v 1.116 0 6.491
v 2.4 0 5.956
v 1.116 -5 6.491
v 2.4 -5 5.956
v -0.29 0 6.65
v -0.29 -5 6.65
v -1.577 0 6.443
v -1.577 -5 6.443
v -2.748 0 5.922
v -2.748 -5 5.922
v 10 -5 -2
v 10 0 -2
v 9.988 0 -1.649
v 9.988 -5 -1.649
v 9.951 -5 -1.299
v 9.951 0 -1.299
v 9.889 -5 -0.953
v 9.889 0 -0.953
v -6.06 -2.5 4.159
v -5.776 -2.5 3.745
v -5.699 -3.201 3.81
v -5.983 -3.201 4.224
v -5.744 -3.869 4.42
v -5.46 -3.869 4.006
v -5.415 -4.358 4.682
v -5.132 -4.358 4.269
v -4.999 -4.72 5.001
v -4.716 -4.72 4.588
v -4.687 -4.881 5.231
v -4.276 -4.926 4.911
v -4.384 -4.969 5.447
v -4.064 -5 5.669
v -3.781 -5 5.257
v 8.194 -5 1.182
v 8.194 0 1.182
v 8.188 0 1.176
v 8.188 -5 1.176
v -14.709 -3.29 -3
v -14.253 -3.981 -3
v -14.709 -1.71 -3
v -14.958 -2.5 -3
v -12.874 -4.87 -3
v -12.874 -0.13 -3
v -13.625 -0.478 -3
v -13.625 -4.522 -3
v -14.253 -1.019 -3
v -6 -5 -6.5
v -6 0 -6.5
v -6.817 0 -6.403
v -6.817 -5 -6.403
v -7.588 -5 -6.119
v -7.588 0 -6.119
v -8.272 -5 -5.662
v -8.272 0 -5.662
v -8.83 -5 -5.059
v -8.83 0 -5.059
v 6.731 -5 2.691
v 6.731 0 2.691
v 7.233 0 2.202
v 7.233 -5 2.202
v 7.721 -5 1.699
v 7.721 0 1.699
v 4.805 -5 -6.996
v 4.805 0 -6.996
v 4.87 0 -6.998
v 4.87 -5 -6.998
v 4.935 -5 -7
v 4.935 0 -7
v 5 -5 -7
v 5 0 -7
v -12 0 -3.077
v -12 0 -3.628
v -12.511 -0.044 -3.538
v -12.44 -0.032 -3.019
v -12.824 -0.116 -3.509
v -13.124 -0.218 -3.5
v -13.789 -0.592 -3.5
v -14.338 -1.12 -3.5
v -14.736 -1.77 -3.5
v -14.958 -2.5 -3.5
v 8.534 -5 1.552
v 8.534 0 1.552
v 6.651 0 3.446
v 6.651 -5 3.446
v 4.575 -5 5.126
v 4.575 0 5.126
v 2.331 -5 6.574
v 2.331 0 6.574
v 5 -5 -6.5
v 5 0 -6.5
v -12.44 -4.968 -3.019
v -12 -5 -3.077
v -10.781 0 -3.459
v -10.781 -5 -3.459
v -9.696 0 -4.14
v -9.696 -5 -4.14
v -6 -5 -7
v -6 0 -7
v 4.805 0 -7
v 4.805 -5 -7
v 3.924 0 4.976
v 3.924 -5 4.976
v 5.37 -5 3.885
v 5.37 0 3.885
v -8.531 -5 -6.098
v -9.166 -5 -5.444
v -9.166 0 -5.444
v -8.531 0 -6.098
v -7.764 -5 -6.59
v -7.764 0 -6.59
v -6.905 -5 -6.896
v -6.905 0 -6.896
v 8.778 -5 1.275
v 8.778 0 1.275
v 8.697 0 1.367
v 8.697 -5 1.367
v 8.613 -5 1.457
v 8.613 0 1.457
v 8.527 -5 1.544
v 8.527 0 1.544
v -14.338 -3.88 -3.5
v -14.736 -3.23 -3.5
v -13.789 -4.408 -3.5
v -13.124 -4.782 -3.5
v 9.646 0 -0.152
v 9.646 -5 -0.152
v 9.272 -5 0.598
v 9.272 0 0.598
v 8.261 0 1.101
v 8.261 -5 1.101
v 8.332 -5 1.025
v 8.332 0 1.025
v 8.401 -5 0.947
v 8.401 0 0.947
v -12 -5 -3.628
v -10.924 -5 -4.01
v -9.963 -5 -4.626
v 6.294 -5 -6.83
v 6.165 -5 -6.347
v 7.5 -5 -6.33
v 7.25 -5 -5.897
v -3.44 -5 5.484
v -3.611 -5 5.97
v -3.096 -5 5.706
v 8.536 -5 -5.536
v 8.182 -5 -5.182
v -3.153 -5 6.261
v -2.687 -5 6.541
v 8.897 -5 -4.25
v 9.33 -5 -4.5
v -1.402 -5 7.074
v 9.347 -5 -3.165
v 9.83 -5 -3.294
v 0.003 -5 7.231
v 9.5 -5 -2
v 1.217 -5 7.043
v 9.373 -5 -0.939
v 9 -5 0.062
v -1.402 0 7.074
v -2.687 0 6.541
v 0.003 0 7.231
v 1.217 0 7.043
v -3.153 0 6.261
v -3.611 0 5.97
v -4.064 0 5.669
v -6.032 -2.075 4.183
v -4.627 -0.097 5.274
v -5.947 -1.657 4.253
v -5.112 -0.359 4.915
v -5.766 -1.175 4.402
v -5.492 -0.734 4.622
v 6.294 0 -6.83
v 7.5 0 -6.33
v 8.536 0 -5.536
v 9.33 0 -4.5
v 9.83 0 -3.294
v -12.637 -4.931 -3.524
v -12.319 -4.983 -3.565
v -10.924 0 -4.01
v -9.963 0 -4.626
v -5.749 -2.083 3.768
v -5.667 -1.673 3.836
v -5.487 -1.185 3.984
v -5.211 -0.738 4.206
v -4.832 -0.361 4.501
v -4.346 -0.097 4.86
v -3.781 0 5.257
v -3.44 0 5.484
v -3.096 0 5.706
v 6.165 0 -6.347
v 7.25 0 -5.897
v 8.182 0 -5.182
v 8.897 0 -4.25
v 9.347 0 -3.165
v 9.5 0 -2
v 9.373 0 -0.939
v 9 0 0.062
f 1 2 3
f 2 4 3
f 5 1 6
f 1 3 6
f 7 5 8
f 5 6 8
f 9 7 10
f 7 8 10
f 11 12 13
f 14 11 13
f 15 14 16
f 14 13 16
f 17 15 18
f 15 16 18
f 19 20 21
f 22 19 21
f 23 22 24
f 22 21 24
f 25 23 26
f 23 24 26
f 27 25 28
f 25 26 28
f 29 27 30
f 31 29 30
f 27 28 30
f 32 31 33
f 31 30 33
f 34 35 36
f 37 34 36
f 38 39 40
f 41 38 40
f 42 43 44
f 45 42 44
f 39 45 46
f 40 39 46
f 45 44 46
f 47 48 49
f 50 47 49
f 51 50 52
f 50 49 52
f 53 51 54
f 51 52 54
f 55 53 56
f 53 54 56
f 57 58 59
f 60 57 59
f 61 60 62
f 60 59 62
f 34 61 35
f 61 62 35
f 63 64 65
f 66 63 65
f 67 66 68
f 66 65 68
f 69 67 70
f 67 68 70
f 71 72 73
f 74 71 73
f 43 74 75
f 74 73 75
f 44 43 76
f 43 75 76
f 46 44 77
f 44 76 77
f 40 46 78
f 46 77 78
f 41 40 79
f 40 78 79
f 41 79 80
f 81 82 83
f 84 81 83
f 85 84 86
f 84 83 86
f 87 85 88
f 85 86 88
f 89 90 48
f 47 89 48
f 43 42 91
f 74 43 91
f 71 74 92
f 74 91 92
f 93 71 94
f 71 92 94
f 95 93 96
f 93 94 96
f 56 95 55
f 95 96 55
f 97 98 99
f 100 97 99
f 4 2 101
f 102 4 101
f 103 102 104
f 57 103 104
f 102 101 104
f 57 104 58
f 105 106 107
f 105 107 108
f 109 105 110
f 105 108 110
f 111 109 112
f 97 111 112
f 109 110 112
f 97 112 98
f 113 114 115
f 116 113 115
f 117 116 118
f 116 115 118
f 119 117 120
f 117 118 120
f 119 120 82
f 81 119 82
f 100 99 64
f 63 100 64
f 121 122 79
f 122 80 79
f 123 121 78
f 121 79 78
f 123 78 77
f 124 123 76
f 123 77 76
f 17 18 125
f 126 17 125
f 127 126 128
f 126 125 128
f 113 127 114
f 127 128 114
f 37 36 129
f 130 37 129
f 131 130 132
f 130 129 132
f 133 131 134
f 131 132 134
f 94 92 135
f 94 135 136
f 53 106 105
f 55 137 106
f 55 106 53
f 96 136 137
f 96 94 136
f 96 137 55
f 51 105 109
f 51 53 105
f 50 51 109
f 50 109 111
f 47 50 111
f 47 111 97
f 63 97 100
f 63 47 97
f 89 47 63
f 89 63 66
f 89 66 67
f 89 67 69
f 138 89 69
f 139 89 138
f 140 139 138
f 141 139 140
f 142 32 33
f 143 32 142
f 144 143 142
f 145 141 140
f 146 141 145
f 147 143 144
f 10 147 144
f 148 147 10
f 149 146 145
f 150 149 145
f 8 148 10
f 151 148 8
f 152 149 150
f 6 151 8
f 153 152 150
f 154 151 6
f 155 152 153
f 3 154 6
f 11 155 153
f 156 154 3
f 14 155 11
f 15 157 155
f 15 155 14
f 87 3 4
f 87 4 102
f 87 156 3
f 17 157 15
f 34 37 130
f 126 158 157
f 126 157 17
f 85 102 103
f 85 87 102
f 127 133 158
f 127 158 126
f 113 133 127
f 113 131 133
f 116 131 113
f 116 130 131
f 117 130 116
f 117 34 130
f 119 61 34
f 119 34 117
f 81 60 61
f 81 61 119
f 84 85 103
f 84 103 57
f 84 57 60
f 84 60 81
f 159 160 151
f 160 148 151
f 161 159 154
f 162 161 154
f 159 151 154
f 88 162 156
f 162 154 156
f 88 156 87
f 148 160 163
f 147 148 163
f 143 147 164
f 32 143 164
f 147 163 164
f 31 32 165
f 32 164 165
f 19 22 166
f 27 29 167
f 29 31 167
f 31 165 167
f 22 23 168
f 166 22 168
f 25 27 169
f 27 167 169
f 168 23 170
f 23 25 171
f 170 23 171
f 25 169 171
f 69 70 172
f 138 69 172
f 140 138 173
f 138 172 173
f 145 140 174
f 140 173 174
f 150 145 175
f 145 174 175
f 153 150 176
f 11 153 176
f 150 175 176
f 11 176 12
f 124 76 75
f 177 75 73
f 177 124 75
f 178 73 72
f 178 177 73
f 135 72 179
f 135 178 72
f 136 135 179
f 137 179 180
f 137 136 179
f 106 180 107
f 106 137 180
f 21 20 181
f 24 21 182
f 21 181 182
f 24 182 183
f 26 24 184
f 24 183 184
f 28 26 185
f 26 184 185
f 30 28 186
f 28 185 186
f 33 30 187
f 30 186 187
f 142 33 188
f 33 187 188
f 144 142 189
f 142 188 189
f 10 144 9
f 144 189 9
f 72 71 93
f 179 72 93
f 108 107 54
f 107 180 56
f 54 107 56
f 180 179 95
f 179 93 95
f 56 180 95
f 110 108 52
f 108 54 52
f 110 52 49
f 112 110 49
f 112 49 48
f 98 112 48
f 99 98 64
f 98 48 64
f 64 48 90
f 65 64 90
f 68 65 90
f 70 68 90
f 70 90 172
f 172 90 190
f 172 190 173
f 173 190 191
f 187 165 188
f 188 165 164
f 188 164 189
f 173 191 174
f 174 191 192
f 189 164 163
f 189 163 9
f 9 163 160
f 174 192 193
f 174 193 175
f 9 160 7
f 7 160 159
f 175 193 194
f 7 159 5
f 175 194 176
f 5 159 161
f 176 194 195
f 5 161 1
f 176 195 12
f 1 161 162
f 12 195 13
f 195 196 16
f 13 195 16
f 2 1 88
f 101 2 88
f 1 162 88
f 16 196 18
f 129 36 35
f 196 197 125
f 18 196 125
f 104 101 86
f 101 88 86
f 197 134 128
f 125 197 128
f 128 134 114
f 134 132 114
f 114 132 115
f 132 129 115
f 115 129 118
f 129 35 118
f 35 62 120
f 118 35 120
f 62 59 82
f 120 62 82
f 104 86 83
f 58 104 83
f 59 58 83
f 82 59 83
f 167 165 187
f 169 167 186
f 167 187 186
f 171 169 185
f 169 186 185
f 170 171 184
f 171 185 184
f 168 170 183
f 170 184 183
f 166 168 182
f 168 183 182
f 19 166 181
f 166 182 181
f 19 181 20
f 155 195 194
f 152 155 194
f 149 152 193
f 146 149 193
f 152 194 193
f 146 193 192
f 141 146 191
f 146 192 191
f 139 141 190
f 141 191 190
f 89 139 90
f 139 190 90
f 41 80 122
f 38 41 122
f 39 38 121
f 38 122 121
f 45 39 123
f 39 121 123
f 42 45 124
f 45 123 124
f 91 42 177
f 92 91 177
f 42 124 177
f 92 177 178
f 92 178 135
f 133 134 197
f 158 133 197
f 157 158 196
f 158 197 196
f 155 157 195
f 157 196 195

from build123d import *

# Parameters (mm, degrees)
F1_DEPTH    = 5
F2_R        = 5
F3_R        = 5
F4_R        = 5
F5_R        = 5
F6_R        = 2.49999
F7_T1_DEPTH = 15.5


# Not quite as in the source:
# - a fillet or chamfer that OpenCascade refuses, or shapes differently, is made with other operations: its cross-section is extruded or revolved along the edge and cut away or added
# - a fillet or chamfer is up to 0.001 mm smaller than in the source, because OpenCascade refuses the exact size
# - ends of sketch curves that miss each other by under 0.0002 mm in the source are joined


with BuildPart() as f1:
    # F0 (on Front) → F1 (new body)
    with BuildSketch(Plane.XZ):
        with BuildLine():
            ThreePointArc((8.5340575526, 1.5524331459), (5.288604189, 4.5896124098), (1.5539747452, 7))
            Line((1.5539747452, 7), (0.4354276506, 7))
            ThreePointArc((0.4354276506, 7), (3.7532215697, 5.0934578086), (6.7313555625, 2.6906724375))
            ThreePointArc((6.7313555625, 2.6906724375), (7.6907583635, 2.2142400773), (8.526661649, 1.544383954))
            Line((8.526661649, 1.544383954), (8.5340575526, 1.5524331459))
        make_face()
        with BuildLine():
            Line((0.4354276506, 7), (1.5539747452, 7))
            ThreePointArc((1.5539747452, 7), (0.9960319704, 7.2841112302), (0.4311083103, 7.5540752821))
            ThreePointArc((0.4311083103, 7.5540752821), (0.1227273169, 7.4207378189), (-0.1837962437, 7.2831841097))
            ThreePointArc((-0.1837962437, 7.2831841097), (0.1268056153, 7.1437566434), (0.4354276506, 7))
        make_face()
        with BuildLine():
            ThreePointArc((-0.1837962437, 7.2831841097), (0.1227273169, 7.4207378189), (0.4311083103, 7.5540752821))
            ThreePointArc((0.4311083103, 7.5540752821), (0.1226739578, 7.6941799666), (-0.1876416897, 7.830066947))
            ThreePointArc((-0.1876416897, 7.830066947), (-0.4960575858, 7.6899267332), (-0.8025462438, 7.5456202987))
            ThreePointArc((-0.8025462438, 7.5456202987), (-0.4922657174, 7.4165371782), (-0.1837962437, 7.2831841097))
        make_face()
        with BuildLine():
            ThreePointArc((9.8891323912, -0.952916211), (9.474622014, 0.231088934), (8.7784454506, 1.2746526497))
            ThreePointArc((8.7784454506, 1.2746526497), (8.6550425686, 1.4118417052), (8.526661649, 1.544383954))
            Line((8.526661649, 1.544383954), (8.1941180403, 1.1824664061))
            ThreePointArc((8.1941180403, 1.1824664061), (8.2977627182, 1.0651806637), (8.4006513445, 0.9472311186))
            ThreePointArc((8.4006513445, 0.9472311186), (9.1684512833, 0.0156127298), (9.8891323912, -0.952916211))
        make_face()
        with BuildLine():
            ThreePointArc((-5.7758389138, 3.7449434933), (-3.3782514437, 5.5249211523), (-0.7819293264, 7))
            Line((-0.7819293264, 7), (-1.874342087, 7))
            ThreePointArc((-1.874342087, 7), (-4.0392081747, 5.6857592036), (-6.0600011216, 4.1592370405))
            Line((-6.0600011216, 4.1592370405), (-5.7758389138, 3.7449434933))
        make_face()
        with BuildLine():
            Line((-1.874342087, 7), (-0.7819293264, 7))
            ThreePointArc((-0.7819293264, 7), (-0.4838189836, 7.143611709), (-0.1837962437, 7.2831841097))
            ThreePointArc((-0.1837962437, 7.2831841097), (-0.4922657174, 7.4165371782), (-0.8025462438, 7.5456202987))
            ThreePointArc((-0.8025462438, 7.5456202987), (-1.341725683, 7.2792562383), (-1.874342087, 7))
        make_face()
        with BuildLine():
            ThreePointArc((8.526661649, 1.544383954), (7.6907583635, 2.2142400773), (6.7313555625, 2.6906724375))
            ThreePointArc((6.7313555625, 2.6906724375), (7.4790116412, 1.9523538866), (8.1941180403, 1.1824664061))
            Line((8.1941180403, 1.1824664061), (8.526661649, 1.544383954))
        make_face()
        with BuildLine():
            ThreePointArc((5, -7), (8.5355339059, -5.5355339059), (10, -2))
            ThreePointArc((10, -2), (9.9722058463, -1.4735315565), (9.8891323912, -0.952916211))
            ThreePointArc((9.8891323912, -0.952916211), (9.1684512833, 0.0156127298), (8.4006513445, 0.9472311186))
            ThreePointArc((8.4006513445, 0.9472311186), (9.2162011355, -0.4272164851), (9.5, -2))
            ThreePointArc((9.5, -2), (8.1819805153, -5.1819805153), (5, -6.5))
            Line((5, -6.5), (5, -7))
        make_face()
        with BuildLine():
            Line((4.8047364689, -6.5), (2.8205505282, -6.5))
            ThreePointArc((2.8205505282, -6.5), (3.7870014268, -6.8506323775), (4.8047364689, -6.9961857605))
            Line((4.8047364689, -6.9961857605), (4.8047364689, -6.5))
        make_face()
        with BuildLine():
            ThreePointArc((4.8047364689, -6.9961857605), (3.7870014268, -6.8506323775), (2.8205505282, -6.5))
            Line((2.8205505282, -6.5), (-4.0635083269, -6.5))
            ThreePointArc((-4.0635083269, -6.5), (-5, -6.8729833462), (-6, -7))
            Line((-6, -7), (4.8047364689, -7))
            Line((4.8047364689, -7), (4.8047364689, -6.9961857605))
        make_face()
        with BuildLine():
            ThreePointArc((8.4006513445, 0.9472311186), (8.2977627182, 1.0651806637), (8.1941180403, 1.1824664061))
            Line((8.1941180403, 1.1824664061), (8.1880677147, 1.1758816487))
            ThreePointArc((8.1880677147, 1.1758816487), (8.2963182158, 1.0633782366), (8.4006513445, 0.9472311186))
        make_face()
        with BuildLine():
            ThreePointArc((4.8047364689, -6.9961857605), (4.9023496096, -6.9990463492), (5, -7))
            Line((5, -7), (5, -6.5))
            Line((5, -6.5), (4.8047364689, -6.5))
            Line((4.8047364689, -6.5), (4.8047364689, -6.9961857605))
        make_face()
        with BuildLine():
            ThreePointArc((-6, -7), (-5, -6.8729833462), (-4.0635083269, -6.5))
            Line((-4.0635083269, -6.5), (-6, -6.5))
            Line((-6, -6.5), (-6, -7))
        make_face()
        with BuildLine():
            Line((-12.1979728804, -3.5), (-11.6333076528, -3.5))
            ThreePointArc((-11.6333076528, -3.5), (-11.4981121732, -3.2492054316), (-11.3600093633, -3))
            Line((-11.3600093633, -3), (-11.9317121995, -3))
            ThreePointArc((-11.9317121995, -3), (-12.0662587747, -3.2492458247), (-12.1979728804, -3.5))
        make_face()
        with BuildLine():
            ThreePointArc((-11.3600093633, -3), (-11.4981121732, -3.2492054316), (-11.6333076528, -3.5))
            Line((-11.6333076528, -3.5), (-10, -3.5))
            Line((-10, -3.5), (-10, -3))
            Line((-10, -3), (-11.3600093633, -3))
        make_face()
        with BuildLine():
            ThreePointArc((-9.9686269666, -3.5), (-9.9921490369, -3.2504916502), (-10, -3))
            Line((-10, -3), (-10, -3.5))
            Line((-10, -3.5), (-9.9686269666, -3.5))
        make_face()
        with BuildLine():
            Line((-9.5, -3), (-10, -3))
            ThreePointArc((-10, -3), (-9.9921490369, -3.2504916502), (-9.9686269666, -3.5))
            Line((-9.9686269666, -3.5), (-9.4641016151, -3.5))
            ThreePointArc((-9.4641016151, -3.5), (-9.491013868, -3.2506435188), (-9.5, -3))
        make_face()
        with BuildLine():
            ThreePointArc((-9.9686269666, -3.5), (-8.6457513111, -6), (-6, -7))
            Line((-6, -7), (-6, -6.5))
            ThreePointArc((-6, -6.5), (-8.2912878475, -5.6457513111), (-9.4641016151, -3.5))
            Line((-9.4641016151, -3.5), (-9.9686269666, -3.5))
        make_face()
        with BuildLine():
            Line((-15, -3.5), (-12.1979728804, -3.5))
            ThreePointArc((-12.1979728804, -3.5), (-12.0662587747, -3.2492458247), (-11.9317121995, -3))
            Line((-11.9317121995, -3), (-15, -3))
            Line((-15, -3), (-15, -3.5))
        make_face()
    extrude(amount=F1_DEPTH)

    # F2
    f2_edges = [f1.edges().sort_by_distance(p)[0] for p in [
        (-9.968627, -2.5, -3.5),
    ]]
    fillet(f2_edges, radius=F2_R)

    # F3
    f3_edges = [f1.edges().sort_by_distance(p)[0] for p in [
        (-9.5, -2.5, -3),
    ]]
    fillet(f3_edges, radius=F3_R)

    # F4
    f4_edges = [f1.edges().sort_by_distance(p)[0] for p in [
        (-0.183796, -2.5, 7.283184),
    ]]
    fillet(f4_edges, radius=F4_R)

    # F5
    f5_edges = [f1.edges().sort_by_distance(p)[0] for p in [
        (-0.187642, -2.5, 7.830067),
    ]]
    fillet(f5_edges, radius=F5_R)

    # F6 (radius 2.5 in the source; OpenCascade refuses exactly that, so slightly less here)
    f6_edges = [f1.edges().sort_by_distance(p)[0] for p in [
        (-5.91792, -5, 3.95209),
        (-5.91792, 0, 3.95209),
    ]]
    fillet(f6_edges, radius=F6_R)

    # F7: fillet of radius 3 on 2 edges, made by hand

    # F7_s2 → F7_t1 (cut)
    with BuildSketch(Plane.XY.offset(-11)):
        with BuildLine():
            ThreePointArc((-15, -2), (-14.1213203436, -4.1213203436), (-12, -5))
            Line((-12, -5), (-15, -5))
            Line((-15, -5), (-15, -2))
        make_face()
        with BuildLine():
            ThreePointArc((-12, 0), (-14.1213203436, -0.8786796564), (-15, -3))
            Line((-15, -3), (-15, 0))
            Line((-15, 0), (-12, 0))
        make_face()
    extrude(amount=F7_T1_DEPTH, mode=Mode.SUBTRACT)


solid = f1.part
